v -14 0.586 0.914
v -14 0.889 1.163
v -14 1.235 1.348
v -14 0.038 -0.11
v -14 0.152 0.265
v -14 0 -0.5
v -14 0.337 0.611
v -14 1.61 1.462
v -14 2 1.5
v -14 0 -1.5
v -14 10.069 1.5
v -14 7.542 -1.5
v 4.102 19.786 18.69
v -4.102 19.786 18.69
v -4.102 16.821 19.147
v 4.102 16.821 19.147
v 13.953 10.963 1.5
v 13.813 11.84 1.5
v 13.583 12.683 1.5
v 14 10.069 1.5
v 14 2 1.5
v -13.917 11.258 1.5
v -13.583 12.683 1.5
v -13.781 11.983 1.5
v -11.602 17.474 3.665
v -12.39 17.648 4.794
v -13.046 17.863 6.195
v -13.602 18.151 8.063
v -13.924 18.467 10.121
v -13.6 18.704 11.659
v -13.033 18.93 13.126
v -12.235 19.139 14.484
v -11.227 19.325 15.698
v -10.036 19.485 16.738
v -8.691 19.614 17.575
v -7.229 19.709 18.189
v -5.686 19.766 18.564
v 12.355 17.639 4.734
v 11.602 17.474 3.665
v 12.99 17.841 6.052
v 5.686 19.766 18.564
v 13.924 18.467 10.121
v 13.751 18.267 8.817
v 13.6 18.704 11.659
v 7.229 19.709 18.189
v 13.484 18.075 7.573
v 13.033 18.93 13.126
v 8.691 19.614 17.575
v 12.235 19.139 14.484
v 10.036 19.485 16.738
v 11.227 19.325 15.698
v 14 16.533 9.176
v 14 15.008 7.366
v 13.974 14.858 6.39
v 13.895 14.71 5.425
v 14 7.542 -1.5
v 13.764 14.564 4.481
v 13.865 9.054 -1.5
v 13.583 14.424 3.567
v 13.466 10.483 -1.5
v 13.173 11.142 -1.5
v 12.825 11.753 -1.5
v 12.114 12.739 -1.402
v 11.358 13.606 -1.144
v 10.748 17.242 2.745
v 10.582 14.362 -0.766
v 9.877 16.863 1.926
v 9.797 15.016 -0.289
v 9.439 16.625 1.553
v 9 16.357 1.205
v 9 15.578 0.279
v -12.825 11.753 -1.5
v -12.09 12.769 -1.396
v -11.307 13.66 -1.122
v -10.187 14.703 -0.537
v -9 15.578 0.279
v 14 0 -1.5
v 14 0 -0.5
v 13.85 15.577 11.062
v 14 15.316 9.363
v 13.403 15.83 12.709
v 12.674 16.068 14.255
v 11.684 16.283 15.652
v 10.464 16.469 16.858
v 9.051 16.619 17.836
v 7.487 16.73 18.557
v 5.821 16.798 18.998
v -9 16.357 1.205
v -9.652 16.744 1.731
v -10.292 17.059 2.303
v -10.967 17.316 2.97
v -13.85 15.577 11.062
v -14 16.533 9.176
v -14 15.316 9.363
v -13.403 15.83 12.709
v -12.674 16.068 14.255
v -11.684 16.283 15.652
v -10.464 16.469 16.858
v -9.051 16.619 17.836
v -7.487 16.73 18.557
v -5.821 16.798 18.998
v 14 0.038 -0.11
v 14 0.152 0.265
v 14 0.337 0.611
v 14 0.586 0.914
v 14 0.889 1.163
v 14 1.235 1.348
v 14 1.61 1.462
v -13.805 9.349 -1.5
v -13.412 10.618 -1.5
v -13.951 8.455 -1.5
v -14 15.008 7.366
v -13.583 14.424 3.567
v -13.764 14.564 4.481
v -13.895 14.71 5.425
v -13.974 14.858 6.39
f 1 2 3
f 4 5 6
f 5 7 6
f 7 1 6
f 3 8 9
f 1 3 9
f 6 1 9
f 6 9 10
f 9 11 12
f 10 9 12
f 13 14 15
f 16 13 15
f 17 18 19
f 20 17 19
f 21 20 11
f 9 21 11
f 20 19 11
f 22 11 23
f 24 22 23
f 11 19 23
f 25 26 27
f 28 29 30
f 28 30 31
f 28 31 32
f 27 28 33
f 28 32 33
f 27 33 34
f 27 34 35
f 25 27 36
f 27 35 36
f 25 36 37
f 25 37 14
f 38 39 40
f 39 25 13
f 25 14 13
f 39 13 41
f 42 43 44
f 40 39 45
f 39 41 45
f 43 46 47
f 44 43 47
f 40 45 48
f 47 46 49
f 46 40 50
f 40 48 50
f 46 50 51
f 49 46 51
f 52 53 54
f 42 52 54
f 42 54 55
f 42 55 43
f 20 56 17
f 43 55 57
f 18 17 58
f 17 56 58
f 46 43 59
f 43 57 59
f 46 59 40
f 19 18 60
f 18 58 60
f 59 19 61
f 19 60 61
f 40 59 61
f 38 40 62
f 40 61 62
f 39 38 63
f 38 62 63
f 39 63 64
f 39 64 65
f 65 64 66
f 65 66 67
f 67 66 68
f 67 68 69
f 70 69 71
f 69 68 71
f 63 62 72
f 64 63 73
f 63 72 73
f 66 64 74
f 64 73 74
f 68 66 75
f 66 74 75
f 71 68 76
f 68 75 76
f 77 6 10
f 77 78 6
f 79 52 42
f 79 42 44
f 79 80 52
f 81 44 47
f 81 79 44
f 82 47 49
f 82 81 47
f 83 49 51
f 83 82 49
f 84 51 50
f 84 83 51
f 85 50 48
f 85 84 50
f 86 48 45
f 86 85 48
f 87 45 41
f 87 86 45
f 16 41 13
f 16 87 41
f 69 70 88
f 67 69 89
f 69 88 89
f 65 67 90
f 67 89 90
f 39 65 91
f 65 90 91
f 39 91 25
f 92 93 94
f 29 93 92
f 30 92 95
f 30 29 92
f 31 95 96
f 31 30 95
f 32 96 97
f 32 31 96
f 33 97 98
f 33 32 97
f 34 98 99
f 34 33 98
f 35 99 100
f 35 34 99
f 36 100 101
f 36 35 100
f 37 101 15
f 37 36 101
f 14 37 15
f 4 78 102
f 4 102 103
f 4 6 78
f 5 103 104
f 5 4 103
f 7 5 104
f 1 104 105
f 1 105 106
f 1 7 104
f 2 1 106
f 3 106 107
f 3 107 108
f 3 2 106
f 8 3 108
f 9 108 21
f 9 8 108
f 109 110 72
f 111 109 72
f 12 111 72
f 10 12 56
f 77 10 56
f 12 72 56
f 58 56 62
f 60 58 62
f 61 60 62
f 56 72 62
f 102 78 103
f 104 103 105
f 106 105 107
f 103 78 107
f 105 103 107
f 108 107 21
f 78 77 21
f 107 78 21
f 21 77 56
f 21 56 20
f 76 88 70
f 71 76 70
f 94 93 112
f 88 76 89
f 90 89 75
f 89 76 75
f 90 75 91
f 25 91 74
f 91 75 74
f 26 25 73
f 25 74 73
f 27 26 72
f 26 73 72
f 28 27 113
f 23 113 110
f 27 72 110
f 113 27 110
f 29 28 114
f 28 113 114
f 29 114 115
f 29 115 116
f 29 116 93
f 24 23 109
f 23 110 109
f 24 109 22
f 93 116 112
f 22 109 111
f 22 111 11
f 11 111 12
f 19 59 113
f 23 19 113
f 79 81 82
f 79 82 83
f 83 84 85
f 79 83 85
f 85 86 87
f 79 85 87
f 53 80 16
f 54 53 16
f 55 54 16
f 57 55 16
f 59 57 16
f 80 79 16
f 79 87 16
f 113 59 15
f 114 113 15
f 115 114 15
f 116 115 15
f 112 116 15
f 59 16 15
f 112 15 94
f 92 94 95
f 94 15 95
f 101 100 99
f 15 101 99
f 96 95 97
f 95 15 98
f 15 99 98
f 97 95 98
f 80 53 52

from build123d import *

# Parameters (mm, degrees)
F0_W        = 28
F0_H        = 3
F3_R        = 9.8982756057
F4_R        = 2
F5_T1_DEPTH = 29.9393718709
F5_T3_DEPTH = 39.6309025582
F5_T5_DEPTH = 35.0165294795


# Not quite as in the source:
# - a fillet or chamfer that OpenCascade refuses, or shapes differently, is made with other operations: its cross-section is extruded or revolved along the edge and cut away or added


with BuildPart() as f2:
    # F2: sweep along a path in F1
    with BuildLine(Plane.YZ) as f2_path:
        Line((0, 0), (13.3813479915, 0))
        Line((13.3813479915, 0), (15.8422850072, 2.9223633464))
        Line((15.8422850072, 2.9223633464), (18.3032229543, 18.9184583724))
    # F0 (on Front) → F2 (sweep)
    with BuildSketch(Plane.XZ):
        Rectangle(F0_W, F0_H)
    sweep(path=f2_path.line, transition=Transition.RIGHT)

    # F3
    f3_edges = [f2.edges().sort_by_distance(p)[0] for p in [
        (14, 18.303223, 18.918458),
        (-14, 18.303223, 18.918458),
    ]]
    fillet(f3_edges, radius=F3_R)

    # F4
    f4_edges = [f2.edges().sort_by_distance(p)[0] for p in [
        (0, 0, 1.5),
    ]]
    fillet(f4_edges, radius=F4_R)

    # F5: fillet of radius 5 on 4 edges, made by hand

    # F5_s2 → F5_t1 (cut)
    with BuildSketch(Plane(origin=(0, -2.9491433719, -3.5021085214), x_dir=(1, 0, 0), z_dir=(0, 0.6441356632, 0.7649112677))):
        with BuildLine():
            ThreePointArc((-9, 11.7355438551), (-12.5355339059, 10.271077761), (-14, 6.7355438551))
            Line((-14, 6.7355438551), (-14, 11.7355438551))
            Line((-14, 11.7355438551), (-9, 11.7355438551))
        make_face()
        with BuildLine():
            ThreePointArc((14, 6.7355438551), (12.5355339059, 10.271077761), (9, 11.7355438551))
            Line((9, 11.7355438551), (14, 11.7355438551))
            Line((14, 11.7355438551), (14, 6.7355438551))
        make_face()
    extrude(amount=F5_T1_DEPTH, mode=Mode.SUBTRACT)

    # F5_s4 → F5_t3 (cut)
    with BuildSketch(Plane.YZ.offset(-19.8154512791)):
        with BuildLine():
            ThreePointArc((11.7530216334, -1.5), (13.8621219652, -1.0333978195), (15.5775779716, 0.279321684))
            Line((15.5775779716, 0.279321684), (14.079202145, -1.5))
            Line((14.079202145, -1.5), (11.7530216334, -1.5))
        make_face()
    extrude(amount=F5_T3_DEPTH, mode=Mode.SUBTRACT)

    # F5_s6 → F5_t5 (cut)
    with BuildSketch(Plane.YZ.offset(-17.5082647397)):
        with BuildLine():
            ThreePointArc((16.356908347, 1.2047767074), (17.0849215873, 2.3580628903), (17.4742104853, 3.6651690265))
            Line((17.4742104853, 3.6651690265), (17.2608277209, 2.2781811991))
            Line((17.2608277209, 2.2781811991), (16.356908347, 1.2047767074))
        make_face()
    extrude(amount=F5_T5_DEPTH, mode=Mode.SUBTRACT)


solid = f2.part
